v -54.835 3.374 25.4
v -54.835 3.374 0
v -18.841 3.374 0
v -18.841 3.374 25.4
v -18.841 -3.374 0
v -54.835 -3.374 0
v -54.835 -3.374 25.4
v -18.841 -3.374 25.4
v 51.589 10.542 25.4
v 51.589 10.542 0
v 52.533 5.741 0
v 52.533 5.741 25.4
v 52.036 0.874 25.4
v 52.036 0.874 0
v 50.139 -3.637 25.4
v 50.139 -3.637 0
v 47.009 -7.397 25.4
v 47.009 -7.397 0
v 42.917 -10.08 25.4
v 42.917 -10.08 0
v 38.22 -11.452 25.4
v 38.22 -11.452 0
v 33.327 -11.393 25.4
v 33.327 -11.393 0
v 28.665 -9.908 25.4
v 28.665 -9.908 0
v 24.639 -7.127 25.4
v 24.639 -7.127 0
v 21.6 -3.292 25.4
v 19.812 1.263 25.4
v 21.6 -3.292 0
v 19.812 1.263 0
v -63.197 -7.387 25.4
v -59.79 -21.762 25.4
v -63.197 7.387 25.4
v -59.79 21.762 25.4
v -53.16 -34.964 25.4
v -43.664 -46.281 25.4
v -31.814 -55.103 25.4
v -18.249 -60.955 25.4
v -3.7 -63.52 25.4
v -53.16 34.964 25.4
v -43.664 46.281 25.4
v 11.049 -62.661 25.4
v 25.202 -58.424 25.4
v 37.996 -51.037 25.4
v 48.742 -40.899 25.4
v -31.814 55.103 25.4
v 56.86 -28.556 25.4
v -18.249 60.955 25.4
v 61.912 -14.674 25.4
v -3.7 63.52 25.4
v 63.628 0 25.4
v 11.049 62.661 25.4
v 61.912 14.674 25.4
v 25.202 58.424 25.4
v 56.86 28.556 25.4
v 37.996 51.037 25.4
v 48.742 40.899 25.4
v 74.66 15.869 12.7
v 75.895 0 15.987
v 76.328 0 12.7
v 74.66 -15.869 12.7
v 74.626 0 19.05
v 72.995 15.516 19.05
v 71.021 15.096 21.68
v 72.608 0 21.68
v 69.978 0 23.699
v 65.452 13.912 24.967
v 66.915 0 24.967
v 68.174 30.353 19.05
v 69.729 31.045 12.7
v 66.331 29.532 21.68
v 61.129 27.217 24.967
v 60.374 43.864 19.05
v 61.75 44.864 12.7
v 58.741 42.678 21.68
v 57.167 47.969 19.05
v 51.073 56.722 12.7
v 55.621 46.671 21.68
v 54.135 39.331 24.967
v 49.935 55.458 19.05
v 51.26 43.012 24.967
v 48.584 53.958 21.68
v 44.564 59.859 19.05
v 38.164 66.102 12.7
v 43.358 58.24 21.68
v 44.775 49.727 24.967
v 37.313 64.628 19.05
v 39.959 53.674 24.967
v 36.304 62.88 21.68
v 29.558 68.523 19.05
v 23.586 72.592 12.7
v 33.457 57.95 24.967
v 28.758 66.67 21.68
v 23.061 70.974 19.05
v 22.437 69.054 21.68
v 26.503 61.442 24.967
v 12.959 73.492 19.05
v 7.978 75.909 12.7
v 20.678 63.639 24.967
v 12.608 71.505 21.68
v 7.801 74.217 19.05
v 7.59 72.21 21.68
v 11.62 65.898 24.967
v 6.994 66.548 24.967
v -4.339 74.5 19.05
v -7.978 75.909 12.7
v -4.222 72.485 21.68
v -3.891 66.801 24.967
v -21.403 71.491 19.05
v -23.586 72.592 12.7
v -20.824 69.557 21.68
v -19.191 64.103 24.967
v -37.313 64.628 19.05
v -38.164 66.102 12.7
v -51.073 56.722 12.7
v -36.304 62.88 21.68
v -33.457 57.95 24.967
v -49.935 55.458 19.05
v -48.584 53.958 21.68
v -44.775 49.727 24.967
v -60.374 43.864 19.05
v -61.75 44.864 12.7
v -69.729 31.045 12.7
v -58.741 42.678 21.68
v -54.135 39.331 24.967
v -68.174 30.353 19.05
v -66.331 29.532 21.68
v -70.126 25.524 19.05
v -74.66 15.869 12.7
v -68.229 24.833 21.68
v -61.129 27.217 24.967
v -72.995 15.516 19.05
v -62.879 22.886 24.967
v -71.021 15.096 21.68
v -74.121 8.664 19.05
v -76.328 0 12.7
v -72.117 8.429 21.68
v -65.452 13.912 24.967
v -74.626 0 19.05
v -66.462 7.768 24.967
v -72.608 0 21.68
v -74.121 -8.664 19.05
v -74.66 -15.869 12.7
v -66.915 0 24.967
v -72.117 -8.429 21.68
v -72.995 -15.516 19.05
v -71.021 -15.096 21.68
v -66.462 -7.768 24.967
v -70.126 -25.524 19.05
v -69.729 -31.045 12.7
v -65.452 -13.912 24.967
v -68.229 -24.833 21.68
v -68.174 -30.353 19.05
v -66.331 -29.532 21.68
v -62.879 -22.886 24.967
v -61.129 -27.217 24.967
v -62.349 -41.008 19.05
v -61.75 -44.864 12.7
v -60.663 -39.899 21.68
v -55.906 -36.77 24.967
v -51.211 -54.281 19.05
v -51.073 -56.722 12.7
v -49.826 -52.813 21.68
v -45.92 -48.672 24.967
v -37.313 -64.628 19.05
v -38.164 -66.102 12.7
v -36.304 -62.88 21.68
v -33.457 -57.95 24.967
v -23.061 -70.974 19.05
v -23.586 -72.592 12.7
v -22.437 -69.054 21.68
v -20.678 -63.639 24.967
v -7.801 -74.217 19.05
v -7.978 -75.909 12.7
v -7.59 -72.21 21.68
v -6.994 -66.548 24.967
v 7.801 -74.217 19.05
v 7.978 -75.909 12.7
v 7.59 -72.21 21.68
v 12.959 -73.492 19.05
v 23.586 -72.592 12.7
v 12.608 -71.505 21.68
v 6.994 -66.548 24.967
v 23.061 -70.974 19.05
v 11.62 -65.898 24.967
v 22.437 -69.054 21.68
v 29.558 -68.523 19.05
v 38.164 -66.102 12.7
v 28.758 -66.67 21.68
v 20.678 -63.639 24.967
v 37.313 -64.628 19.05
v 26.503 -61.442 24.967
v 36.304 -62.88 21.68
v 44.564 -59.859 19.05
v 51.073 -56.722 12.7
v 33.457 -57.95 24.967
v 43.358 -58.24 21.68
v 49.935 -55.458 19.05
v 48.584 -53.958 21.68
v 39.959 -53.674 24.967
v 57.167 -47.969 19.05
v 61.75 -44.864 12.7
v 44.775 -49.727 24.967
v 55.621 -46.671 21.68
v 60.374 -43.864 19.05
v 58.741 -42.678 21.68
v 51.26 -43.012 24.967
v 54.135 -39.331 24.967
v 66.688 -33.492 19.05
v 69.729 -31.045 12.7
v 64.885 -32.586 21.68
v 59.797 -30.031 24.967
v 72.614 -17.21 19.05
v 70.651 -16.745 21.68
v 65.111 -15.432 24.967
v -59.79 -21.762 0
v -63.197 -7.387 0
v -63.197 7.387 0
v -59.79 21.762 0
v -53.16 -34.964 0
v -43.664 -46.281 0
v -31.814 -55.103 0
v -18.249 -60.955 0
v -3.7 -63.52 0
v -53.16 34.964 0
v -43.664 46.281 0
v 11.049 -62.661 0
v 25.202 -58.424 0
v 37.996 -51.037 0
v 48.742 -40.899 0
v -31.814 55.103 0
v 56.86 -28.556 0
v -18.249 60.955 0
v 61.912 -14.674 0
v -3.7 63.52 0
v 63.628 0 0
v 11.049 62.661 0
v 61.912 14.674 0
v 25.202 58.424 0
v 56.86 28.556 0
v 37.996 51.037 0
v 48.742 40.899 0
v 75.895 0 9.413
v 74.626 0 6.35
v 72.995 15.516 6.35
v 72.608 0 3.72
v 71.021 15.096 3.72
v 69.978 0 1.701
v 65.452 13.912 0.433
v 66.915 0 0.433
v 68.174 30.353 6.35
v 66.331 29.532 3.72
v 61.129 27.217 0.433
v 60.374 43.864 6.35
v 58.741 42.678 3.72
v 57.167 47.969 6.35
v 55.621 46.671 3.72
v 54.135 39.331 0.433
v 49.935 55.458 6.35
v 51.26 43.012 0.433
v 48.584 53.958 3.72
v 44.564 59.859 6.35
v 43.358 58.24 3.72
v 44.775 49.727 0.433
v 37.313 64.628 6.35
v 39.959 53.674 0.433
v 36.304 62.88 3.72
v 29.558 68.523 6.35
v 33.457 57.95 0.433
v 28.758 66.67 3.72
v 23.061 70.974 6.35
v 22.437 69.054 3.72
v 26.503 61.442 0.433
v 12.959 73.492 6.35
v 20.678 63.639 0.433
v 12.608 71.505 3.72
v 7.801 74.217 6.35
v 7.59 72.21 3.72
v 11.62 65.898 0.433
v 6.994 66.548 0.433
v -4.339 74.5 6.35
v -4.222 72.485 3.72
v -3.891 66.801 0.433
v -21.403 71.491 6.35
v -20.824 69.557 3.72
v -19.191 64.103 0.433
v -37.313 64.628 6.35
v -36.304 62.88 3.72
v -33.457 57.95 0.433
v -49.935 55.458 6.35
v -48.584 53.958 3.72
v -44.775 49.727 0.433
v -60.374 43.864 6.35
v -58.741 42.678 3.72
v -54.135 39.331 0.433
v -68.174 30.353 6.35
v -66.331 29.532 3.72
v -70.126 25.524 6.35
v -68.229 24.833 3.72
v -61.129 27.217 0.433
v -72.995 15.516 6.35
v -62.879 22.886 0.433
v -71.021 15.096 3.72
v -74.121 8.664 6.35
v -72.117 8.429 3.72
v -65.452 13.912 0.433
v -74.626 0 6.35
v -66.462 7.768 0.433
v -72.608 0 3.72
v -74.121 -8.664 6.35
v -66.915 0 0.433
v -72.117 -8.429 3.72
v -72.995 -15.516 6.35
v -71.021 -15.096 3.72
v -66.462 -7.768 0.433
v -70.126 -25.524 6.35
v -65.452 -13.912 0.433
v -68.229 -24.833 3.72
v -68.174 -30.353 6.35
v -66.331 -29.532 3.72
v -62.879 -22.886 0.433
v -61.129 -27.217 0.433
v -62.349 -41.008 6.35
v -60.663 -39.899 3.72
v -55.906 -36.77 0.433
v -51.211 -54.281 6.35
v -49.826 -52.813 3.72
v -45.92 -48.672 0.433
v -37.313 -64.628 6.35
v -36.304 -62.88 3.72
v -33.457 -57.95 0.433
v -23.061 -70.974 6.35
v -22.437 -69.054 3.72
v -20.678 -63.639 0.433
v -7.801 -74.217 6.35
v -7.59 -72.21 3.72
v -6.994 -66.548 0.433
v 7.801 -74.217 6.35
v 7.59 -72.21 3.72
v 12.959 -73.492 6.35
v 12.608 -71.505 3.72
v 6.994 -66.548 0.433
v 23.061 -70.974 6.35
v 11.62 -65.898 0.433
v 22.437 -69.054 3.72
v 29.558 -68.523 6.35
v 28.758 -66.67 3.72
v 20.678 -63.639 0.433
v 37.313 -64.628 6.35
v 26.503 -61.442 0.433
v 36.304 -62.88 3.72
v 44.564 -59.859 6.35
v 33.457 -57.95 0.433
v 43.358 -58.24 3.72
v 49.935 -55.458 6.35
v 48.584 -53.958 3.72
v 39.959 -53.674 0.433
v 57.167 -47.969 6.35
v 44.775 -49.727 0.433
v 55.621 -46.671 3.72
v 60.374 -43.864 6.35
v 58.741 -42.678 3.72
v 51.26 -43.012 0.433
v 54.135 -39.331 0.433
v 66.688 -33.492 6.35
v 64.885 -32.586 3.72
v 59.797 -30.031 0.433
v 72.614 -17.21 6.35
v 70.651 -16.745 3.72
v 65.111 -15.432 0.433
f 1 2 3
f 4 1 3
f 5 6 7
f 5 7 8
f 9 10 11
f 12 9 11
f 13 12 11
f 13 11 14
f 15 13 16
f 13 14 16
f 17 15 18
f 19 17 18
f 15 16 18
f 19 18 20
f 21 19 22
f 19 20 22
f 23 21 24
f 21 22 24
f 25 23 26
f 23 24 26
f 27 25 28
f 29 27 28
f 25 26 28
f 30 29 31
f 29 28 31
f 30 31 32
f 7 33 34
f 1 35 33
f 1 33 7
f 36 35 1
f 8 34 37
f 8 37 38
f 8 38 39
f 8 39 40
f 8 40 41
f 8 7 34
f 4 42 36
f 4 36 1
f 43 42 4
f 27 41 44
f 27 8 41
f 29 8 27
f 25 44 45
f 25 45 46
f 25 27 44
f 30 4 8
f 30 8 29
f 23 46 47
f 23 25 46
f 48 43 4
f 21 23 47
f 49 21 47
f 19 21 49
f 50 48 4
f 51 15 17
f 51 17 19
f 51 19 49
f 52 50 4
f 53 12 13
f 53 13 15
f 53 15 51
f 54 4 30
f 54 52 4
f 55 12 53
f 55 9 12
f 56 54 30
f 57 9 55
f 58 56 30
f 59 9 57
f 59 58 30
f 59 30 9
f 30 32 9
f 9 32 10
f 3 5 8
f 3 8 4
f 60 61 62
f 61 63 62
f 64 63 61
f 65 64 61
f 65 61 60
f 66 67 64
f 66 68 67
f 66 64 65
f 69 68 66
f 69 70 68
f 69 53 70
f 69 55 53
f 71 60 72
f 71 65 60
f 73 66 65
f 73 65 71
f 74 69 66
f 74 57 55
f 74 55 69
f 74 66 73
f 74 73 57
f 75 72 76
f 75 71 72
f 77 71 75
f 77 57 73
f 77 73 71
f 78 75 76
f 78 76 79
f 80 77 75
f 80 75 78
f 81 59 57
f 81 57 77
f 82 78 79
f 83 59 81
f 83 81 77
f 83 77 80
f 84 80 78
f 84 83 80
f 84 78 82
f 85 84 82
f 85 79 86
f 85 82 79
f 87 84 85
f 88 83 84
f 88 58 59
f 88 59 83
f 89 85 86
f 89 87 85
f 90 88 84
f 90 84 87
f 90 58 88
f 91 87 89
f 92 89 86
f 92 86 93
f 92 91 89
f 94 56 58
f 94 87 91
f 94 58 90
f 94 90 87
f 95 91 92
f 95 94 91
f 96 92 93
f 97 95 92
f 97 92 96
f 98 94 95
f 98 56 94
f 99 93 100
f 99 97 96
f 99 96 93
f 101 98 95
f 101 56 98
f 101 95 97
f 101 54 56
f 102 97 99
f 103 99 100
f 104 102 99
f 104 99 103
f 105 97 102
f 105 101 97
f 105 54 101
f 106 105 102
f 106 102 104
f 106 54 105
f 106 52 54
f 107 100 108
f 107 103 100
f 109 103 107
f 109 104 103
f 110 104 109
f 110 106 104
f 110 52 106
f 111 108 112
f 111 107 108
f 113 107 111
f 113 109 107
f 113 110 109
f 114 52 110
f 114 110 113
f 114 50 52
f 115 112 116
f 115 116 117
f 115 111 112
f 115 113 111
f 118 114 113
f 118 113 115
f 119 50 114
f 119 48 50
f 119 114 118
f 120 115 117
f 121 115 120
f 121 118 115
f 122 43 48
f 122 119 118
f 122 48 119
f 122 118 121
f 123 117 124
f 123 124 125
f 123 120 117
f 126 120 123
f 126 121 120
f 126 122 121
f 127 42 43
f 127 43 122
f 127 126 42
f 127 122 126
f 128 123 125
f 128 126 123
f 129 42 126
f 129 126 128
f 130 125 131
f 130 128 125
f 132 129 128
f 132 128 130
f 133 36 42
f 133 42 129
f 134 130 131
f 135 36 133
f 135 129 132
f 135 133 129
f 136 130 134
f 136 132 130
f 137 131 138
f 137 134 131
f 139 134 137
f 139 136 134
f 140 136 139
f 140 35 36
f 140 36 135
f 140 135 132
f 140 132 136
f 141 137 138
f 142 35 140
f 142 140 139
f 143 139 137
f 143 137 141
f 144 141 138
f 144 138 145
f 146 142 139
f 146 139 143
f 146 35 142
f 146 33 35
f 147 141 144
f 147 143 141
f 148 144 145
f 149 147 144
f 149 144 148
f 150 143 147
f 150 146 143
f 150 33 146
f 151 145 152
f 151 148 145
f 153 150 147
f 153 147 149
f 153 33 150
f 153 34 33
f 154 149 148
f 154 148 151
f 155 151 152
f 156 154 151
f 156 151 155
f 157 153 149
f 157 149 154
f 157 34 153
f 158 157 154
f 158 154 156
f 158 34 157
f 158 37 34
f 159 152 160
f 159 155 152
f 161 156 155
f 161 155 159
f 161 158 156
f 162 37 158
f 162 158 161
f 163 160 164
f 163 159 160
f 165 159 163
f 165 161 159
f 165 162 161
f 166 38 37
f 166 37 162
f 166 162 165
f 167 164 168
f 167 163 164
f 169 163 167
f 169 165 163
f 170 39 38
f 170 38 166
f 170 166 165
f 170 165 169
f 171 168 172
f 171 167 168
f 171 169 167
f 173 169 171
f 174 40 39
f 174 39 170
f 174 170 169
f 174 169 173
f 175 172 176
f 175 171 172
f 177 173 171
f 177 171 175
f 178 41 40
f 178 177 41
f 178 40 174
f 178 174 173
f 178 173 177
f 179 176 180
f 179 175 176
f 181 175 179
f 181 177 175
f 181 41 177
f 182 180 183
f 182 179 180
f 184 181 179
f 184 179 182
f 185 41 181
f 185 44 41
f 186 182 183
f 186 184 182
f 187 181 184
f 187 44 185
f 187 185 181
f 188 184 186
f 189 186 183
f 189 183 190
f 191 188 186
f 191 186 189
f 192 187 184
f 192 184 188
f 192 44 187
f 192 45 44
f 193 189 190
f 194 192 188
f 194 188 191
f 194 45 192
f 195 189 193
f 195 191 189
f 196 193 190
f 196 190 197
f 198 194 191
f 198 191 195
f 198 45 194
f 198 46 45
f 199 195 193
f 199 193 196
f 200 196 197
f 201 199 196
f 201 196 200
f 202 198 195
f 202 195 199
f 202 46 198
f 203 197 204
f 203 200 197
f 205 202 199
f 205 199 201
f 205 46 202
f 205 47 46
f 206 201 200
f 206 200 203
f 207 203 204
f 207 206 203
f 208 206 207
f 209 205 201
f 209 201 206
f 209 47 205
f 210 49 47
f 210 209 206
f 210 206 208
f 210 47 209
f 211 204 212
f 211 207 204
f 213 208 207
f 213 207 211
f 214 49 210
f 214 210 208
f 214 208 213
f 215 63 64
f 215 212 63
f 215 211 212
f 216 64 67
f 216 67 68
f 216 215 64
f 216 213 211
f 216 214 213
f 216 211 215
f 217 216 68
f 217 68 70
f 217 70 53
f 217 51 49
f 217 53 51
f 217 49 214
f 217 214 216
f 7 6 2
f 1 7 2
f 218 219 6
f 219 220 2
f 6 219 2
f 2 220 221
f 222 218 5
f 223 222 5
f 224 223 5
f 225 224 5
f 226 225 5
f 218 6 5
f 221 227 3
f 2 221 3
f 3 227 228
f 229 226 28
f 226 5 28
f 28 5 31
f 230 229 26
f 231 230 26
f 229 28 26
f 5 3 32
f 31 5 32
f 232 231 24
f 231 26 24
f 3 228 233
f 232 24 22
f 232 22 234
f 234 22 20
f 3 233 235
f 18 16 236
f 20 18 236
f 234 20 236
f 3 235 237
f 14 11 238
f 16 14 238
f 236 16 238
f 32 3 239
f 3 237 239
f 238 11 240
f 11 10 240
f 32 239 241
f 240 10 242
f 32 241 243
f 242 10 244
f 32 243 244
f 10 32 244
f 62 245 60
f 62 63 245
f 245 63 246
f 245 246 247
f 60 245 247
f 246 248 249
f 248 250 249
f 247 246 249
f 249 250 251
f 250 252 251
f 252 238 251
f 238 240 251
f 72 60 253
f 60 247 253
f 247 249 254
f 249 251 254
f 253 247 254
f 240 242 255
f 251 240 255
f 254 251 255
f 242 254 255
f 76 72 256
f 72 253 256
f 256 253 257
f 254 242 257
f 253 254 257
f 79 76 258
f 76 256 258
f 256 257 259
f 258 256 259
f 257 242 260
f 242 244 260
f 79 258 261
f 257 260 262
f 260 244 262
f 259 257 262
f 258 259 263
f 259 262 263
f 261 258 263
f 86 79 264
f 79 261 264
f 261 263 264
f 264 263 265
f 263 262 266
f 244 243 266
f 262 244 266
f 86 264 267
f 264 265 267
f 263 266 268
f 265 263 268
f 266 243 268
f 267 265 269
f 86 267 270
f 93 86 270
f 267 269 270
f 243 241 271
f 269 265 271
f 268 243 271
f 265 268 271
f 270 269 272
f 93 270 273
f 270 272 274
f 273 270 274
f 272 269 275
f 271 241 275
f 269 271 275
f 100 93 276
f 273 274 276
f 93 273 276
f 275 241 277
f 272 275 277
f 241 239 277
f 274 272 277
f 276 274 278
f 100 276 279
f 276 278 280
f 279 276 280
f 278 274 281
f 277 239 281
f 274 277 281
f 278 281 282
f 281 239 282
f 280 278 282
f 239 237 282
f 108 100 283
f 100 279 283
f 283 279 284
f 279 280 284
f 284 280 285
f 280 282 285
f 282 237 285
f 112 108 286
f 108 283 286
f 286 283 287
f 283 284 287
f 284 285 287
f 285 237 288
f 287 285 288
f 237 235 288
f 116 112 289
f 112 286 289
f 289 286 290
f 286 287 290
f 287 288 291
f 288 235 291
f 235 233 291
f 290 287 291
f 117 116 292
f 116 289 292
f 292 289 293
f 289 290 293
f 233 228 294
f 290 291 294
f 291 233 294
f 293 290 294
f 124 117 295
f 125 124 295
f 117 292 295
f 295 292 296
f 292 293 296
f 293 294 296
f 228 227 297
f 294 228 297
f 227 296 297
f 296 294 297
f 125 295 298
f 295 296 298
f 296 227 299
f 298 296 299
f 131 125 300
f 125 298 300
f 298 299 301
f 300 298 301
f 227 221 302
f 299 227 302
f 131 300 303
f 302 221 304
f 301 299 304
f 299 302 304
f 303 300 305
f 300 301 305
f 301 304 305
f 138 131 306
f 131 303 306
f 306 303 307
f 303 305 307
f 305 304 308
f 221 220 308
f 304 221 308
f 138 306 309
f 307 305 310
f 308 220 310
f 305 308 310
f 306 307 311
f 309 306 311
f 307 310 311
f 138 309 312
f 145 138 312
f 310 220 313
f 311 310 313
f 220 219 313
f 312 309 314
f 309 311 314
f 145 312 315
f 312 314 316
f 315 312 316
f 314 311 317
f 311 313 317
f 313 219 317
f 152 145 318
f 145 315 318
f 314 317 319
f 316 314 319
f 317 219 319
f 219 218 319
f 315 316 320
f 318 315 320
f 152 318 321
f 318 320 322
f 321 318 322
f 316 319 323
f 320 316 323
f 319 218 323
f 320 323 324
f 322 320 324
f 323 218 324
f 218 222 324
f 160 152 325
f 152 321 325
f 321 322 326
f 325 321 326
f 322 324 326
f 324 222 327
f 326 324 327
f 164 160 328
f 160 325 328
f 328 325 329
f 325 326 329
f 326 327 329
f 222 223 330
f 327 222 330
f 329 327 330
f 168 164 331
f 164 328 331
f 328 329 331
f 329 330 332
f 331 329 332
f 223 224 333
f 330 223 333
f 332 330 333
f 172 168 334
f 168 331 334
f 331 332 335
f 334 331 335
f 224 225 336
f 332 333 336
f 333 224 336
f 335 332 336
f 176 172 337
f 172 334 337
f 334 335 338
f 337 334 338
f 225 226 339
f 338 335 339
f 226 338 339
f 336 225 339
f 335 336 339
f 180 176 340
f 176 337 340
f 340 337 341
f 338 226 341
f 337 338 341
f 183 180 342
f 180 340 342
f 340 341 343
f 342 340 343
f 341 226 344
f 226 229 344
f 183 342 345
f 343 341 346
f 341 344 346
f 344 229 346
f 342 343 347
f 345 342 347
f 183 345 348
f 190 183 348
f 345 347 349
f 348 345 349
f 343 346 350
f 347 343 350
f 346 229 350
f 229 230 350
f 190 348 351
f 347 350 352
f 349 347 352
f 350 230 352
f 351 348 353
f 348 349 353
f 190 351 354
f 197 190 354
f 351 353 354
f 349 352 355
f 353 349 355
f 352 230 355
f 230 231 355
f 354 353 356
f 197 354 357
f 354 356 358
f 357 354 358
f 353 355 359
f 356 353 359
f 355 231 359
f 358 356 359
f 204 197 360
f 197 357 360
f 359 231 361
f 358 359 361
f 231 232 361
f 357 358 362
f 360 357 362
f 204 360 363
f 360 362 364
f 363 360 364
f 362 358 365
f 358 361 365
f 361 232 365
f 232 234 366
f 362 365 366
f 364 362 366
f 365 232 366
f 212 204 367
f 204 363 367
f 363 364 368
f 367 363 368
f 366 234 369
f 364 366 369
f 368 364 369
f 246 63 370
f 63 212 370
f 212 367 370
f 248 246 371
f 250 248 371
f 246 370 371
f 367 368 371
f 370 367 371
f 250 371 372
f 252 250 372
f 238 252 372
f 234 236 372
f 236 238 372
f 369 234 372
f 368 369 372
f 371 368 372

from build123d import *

# Parameters (mm, degrees)
F0_R     = 76.327515992
F0_W     = 35.994451493
F0_H     = 6.7489598878
F1_DEPTH = 25.4
F2_R     = 12.69999


# Not quite as in the source:
# - a fillet or chamfer is up to 0.001 mm smaller than in the source, because OpenCascade refuses the exact size


with BuildPart() as f1:
    # F0 (on Top) → F1 (new body)
    with BuildSketch(Plane.XY):
        Circle(F0_R)
        with BuildLine():
            ThreePointArc((0, 71.7222208521), (50.7152687262, 50.7152687262), (71.7222208521, 0))
            ThreePointArc((71.7222208521, 0), (50.7152687263, -50.7152687262), (0, -71.7222208521))
            ThreePointArc((0, -71.7222208521), (-71.7222208521, 0), (0, 71.7222208521))
        make_face(mode=Mode.SUBTRACT)
        with BuildLine():
            ThreePointArc((0, -71.7222208521), (50.7152687263, -50.7152687262), (71.7222208521, 0))
            ThreePointArc((71.7222208521, 0), (50.7152687262, 50.7152687262), (0, 71.7222208521))
            Line((0, 71.7222208521), (0, -71.7222208521))
        make_face()
        with BuildLine():
            ThreePointArc((51.5885779704, 10.5423588198), (40.6190136024, -10.9400752111), (19.8122242535, 1.2625405457))
            Line((19.8122242535, 1.2625405457), (51.5885779704, 10.5423588198))
        make_face(mode=Mode.SUBTRACT)
        with BuildLine():
            Line((0, -71.7222208521), (0, 71.7222208521))
            ThreePointArc((0, 71.7222208521), (-71.7222208521, 0), (0, -71.7222208521))
        make_face()
        with Locations((-36.8380714208, 0)):
            Rectangle(F0_W, F0_H, mode=Mode.SUBTRACT)
    extrude(amount=F1_DEPTH)

    # F2 (radius 12.7 in the source; OpenCascade refuses exactly that, so slightly less here)
    f2_edges = [f1.edges().sort_by_distance(p)[0] for p in [
        (-76.327516, 0, 25.4),
        (-76.327516, 0, 0),
    ]]
    fillet(f2_edges, radius=F2_R)


solid = f1.part
